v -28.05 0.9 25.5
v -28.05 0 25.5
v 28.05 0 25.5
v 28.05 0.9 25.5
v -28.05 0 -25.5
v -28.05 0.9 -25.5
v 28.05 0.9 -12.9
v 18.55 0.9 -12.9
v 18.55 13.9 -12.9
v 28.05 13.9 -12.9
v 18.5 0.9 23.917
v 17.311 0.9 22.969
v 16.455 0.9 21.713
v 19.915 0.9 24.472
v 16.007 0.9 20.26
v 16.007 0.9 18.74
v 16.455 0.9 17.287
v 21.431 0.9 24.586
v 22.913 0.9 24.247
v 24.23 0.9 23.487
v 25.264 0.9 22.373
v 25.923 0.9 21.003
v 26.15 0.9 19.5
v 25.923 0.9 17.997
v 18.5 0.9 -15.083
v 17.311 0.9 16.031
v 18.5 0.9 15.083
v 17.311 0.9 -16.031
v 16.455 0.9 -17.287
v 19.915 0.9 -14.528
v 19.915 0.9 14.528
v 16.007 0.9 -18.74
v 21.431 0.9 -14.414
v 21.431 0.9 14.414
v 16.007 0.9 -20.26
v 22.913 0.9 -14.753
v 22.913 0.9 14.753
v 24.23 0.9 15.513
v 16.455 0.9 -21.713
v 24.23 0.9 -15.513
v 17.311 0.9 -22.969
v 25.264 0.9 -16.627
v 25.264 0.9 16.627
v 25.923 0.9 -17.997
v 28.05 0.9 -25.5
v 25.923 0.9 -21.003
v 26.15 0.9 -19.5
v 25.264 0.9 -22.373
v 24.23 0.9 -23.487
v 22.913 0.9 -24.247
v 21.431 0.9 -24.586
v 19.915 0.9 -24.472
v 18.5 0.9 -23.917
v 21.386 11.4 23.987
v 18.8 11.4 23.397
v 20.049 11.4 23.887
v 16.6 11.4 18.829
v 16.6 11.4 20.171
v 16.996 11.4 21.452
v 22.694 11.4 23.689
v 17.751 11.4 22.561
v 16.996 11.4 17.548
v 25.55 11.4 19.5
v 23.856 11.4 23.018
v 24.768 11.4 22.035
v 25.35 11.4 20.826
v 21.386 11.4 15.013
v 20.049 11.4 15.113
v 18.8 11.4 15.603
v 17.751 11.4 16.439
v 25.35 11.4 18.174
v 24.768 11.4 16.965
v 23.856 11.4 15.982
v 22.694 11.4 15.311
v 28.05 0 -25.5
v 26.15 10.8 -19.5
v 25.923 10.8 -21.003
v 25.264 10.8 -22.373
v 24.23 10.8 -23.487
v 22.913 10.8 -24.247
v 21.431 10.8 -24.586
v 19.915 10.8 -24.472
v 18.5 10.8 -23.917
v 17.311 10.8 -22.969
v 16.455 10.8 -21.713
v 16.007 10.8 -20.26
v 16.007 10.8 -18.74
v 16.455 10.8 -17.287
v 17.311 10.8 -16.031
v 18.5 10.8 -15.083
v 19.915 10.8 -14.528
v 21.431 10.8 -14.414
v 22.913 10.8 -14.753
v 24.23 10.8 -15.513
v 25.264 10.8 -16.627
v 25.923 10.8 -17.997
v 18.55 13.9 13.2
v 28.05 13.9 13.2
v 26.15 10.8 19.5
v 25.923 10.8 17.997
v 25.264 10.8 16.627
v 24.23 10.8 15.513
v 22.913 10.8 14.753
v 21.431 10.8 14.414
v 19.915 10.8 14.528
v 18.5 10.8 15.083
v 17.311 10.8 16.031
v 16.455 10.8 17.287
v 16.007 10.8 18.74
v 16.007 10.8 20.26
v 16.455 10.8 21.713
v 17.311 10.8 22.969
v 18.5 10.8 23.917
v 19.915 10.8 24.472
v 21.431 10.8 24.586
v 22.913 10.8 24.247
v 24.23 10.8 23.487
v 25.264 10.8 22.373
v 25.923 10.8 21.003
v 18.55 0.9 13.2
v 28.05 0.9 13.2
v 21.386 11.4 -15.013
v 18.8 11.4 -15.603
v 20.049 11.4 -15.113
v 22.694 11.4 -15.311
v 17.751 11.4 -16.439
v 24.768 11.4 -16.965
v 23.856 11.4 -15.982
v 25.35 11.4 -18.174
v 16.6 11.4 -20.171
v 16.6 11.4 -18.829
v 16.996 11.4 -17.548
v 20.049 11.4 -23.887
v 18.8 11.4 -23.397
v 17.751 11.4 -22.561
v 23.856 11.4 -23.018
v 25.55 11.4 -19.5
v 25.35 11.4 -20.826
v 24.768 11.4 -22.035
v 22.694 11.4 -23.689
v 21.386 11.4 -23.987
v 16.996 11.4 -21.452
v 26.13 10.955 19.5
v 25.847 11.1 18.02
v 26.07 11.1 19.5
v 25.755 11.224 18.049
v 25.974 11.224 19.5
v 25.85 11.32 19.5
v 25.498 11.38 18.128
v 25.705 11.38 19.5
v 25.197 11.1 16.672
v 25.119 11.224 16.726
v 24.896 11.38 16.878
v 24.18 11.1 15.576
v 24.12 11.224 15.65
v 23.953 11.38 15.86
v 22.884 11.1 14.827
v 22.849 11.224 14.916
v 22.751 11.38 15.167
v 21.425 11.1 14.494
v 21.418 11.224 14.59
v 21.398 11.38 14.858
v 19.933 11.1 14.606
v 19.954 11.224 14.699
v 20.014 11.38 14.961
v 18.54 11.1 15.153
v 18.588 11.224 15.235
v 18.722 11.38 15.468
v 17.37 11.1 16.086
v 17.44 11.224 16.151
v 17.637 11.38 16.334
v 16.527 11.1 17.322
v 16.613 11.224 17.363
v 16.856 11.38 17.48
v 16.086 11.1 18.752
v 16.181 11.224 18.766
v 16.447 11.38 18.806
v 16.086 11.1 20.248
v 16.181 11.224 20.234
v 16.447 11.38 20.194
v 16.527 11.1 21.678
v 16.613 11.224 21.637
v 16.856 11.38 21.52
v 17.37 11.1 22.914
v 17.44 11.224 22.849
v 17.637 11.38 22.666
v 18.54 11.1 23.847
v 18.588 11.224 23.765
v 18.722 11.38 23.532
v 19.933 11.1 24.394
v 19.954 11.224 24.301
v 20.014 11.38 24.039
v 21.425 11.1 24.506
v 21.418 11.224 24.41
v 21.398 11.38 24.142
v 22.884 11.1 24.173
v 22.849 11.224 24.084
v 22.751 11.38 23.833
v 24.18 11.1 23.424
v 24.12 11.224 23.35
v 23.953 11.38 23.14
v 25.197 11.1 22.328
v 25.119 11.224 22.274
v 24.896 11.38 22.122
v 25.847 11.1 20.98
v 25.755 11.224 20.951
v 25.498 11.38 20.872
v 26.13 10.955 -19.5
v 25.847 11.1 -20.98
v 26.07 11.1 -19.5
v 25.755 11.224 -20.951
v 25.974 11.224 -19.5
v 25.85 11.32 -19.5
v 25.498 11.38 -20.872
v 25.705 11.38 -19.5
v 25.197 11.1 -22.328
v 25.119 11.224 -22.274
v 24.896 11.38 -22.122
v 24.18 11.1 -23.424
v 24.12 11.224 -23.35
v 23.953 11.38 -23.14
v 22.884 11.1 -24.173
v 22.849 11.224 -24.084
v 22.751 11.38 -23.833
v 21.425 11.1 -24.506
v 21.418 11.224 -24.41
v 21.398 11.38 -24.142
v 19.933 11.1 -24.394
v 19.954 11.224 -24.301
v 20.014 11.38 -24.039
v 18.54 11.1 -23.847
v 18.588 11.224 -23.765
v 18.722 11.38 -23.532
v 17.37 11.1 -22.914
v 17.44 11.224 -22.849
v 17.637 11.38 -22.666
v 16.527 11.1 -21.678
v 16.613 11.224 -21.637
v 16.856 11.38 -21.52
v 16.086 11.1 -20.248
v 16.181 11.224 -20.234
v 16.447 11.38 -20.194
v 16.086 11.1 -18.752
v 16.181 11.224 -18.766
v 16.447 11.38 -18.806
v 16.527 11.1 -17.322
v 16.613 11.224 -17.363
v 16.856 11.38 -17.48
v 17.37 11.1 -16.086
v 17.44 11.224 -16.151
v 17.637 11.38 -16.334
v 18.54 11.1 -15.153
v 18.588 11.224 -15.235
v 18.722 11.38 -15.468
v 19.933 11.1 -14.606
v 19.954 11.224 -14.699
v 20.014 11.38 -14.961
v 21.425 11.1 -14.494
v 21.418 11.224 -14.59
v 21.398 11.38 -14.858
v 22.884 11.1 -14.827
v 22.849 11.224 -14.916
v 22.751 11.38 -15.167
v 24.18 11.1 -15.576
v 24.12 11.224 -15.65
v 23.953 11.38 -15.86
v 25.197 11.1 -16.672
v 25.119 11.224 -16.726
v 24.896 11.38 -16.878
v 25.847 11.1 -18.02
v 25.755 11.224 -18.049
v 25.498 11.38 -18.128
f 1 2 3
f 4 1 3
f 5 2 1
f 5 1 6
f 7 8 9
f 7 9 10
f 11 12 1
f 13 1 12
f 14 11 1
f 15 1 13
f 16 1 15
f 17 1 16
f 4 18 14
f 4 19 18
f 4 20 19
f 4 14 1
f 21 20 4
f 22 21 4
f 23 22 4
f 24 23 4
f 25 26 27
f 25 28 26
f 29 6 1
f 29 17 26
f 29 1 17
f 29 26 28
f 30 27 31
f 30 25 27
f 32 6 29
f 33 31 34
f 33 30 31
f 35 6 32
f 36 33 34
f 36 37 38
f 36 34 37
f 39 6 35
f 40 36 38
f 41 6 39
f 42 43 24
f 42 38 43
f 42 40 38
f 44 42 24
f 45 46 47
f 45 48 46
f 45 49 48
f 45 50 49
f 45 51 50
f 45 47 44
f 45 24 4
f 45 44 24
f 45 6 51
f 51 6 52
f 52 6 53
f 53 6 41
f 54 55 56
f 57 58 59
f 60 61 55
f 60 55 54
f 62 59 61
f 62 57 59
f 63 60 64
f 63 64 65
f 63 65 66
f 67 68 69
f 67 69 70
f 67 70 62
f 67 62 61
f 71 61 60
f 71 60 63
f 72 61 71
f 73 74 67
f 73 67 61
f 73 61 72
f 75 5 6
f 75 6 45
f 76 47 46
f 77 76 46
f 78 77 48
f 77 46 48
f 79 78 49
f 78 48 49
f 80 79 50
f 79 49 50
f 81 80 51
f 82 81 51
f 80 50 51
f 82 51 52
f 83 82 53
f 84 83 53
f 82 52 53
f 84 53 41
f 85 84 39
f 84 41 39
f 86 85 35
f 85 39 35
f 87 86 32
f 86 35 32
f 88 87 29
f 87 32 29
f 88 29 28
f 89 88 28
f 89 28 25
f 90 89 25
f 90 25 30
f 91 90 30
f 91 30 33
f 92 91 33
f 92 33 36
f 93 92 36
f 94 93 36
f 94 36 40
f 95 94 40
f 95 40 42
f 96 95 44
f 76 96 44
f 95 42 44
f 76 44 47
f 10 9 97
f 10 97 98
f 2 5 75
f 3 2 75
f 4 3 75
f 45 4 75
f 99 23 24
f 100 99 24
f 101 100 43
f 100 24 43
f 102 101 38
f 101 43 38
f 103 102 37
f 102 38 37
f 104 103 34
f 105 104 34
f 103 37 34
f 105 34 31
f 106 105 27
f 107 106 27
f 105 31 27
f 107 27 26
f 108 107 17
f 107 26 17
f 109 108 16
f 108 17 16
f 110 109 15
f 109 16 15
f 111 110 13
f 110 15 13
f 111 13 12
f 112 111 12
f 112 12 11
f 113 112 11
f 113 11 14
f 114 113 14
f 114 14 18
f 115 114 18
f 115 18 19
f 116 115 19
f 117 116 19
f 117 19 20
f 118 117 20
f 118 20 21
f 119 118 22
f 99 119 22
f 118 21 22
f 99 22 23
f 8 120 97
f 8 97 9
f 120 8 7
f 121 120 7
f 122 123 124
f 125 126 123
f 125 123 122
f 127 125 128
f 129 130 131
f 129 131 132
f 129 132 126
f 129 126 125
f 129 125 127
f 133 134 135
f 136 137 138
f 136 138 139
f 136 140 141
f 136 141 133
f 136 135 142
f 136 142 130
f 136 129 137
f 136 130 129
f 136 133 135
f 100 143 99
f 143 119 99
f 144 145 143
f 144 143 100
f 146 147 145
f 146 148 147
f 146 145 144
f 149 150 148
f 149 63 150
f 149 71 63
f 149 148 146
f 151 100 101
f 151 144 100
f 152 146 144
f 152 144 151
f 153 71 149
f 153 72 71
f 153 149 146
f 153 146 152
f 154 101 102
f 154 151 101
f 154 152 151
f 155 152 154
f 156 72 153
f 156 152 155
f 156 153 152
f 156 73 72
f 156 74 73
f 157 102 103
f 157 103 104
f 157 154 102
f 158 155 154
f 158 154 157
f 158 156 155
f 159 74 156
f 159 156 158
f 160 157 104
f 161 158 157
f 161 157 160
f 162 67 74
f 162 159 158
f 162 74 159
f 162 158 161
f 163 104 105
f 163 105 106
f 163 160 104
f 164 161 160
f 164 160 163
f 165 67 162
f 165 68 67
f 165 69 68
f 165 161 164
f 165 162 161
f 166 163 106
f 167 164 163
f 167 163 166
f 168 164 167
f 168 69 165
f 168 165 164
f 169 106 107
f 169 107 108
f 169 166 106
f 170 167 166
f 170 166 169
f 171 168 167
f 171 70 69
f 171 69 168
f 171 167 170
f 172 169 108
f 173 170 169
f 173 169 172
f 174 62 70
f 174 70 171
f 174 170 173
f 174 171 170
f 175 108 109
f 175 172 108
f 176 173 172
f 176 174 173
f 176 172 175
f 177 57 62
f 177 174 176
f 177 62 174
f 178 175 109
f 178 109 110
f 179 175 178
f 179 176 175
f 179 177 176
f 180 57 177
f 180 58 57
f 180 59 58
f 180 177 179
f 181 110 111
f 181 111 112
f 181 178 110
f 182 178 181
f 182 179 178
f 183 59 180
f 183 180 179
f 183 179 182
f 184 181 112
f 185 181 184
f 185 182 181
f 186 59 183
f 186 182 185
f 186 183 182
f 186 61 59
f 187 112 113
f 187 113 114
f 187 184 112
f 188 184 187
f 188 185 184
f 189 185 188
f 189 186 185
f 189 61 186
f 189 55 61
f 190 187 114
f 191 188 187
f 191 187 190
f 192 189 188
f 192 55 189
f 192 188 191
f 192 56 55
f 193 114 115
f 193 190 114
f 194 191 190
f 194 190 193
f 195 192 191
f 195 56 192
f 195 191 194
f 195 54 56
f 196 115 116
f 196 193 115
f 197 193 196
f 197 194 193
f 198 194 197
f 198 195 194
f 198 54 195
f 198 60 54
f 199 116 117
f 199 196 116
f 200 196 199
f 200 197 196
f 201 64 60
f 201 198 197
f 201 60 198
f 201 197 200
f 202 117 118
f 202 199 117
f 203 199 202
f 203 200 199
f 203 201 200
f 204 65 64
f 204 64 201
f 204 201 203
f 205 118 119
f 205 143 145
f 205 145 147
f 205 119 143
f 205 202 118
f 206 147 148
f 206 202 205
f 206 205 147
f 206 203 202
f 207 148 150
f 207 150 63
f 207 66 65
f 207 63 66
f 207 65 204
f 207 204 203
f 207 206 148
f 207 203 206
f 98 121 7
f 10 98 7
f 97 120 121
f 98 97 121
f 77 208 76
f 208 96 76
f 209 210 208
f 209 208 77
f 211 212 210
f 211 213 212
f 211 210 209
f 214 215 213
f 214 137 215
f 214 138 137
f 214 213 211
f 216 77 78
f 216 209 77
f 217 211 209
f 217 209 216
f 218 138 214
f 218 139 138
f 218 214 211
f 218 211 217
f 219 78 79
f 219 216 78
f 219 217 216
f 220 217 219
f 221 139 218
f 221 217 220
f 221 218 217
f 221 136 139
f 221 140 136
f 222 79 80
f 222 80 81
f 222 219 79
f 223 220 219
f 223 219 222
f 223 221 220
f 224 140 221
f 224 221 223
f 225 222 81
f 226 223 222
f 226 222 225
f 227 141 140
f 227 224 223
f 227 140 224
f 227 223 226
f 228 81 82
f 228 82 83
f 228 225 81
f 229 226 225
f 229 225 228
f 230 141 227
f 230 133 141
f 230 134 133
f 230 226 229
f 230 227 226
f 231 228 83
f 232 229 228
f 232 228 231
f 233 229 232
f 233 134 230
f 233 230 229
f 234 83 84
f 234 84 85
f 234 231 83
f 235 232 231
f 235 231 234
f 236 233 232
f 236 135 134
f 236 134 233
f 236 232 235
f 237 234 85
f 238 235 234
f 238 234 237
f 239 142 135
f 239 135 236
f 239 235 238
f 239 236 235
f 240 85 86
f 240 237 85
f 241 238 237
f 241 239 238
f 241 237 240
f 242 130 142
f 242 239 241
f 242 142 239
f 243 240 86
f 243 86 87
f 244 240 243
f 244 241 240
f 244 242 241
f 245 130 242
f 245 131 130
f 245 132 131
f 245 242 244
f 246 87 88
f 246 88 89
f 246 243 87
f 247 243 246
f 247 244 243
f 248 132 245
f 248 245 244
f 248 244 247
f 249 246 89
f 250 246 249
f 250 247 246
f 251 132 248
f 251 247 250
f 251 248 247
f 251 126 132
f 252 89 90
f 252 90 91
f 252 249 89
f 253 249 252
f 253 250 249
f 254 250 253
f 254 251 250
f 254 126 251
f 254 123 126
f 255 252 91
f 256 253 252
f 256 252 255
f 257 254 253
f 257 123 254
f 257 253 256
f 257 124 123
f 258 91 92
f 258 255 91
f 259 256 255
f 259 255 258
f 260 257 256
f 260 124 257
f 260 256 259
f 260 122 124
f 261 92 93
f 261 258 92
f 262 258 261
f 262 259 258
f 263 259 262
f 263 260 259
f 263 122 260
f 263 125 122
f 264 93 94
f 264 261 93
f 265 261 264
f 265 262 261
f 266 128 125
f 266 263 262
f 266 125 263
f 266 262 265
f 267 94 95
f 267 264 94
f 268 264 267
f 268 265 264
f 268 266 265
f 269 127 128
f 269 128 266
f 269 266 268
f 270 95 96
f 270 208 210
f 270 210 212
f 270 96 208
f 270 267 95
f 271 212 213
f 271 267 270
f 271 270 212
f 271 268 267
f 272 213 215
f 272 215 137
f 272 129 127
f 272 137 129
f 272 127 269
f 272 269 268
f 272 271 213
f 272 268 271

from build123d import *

# Parameters (mm, degrees)
SKIZZE1_W                       = 56.1
SKIZZE1_H                       = 51
AUFSATZ_LINEAR_AUSTRAGEN1_DEPTH = 0.9
SKIZZE2_W                       = 9.5
SKIZZE2_H                       = 26.1
AUFSATZ_LINEAR_AUSTRAGEN2_DEPTH = 13
SKIZZE3_R                       = 5.1
AUFSATZ_LINEAR_AUSTRAGEN3_DEPTH = 10.5
VERRUNDUNG1_R                   = 0.6


with BuildPart() as part:
    # Skizze1 → Aufsatz-Linear austragen1 (new body)
    with BuildSketch(Plane(origin=(0, 0, 0), x_dir=(1, 0, 0), z_dir=(0, 1, 0))):
        Rectangle(SKIZZE1_W, SKIZZE1_H)
    extrude(amount=AUFSATZ_LINEAR_AUSTRAGEN1_DEPTH)

    # Skizze3 → Aufsatz-Linear austragen3 (add)
    with BuildSketch(Plane(origin=(0, 0.9, 0), x_dir=(1, 0, 0), z_dir=(0, 1, 0))):
        with Locations((21.05, 19.5)):
            Circle(SKIZZE3_R)
        with Locations((21.05, -19.5)):
            Circle(SKIZZE3_R)
    extrude(amount=AUFSATZ_LINEAR_AUSTRAGEN3_DEPTH)

    # Verrundung1
    verrundung1_edges = [part.edges().sort_by_distance(p)[0] for p in [
        (15.95, 11.4, -19.5),
        (15.95, 11.4, 19.5),
    ]]
    fillet(verrundung1_edges, radius=VERRUNDUNG1_R)


with BuildPart() as body_2:
    # Skizze2 → Aufsatz-Linear austragen2 (new body)
    with BuildSketch(Plane(origin=(0, 0.9, 0), x_dir=(1, 0, 0), z_dir=(0, 1, 0))):
        with Locations((23.3, -0.15)):
            Rectangle(SKIZZE2_W, SKIZZE2_H)
    extrude(amount=AUFSATZ_LINEAR_AUSTRAGEN2_DEPTH)


solid = Compound([part.part, body_2.part])
